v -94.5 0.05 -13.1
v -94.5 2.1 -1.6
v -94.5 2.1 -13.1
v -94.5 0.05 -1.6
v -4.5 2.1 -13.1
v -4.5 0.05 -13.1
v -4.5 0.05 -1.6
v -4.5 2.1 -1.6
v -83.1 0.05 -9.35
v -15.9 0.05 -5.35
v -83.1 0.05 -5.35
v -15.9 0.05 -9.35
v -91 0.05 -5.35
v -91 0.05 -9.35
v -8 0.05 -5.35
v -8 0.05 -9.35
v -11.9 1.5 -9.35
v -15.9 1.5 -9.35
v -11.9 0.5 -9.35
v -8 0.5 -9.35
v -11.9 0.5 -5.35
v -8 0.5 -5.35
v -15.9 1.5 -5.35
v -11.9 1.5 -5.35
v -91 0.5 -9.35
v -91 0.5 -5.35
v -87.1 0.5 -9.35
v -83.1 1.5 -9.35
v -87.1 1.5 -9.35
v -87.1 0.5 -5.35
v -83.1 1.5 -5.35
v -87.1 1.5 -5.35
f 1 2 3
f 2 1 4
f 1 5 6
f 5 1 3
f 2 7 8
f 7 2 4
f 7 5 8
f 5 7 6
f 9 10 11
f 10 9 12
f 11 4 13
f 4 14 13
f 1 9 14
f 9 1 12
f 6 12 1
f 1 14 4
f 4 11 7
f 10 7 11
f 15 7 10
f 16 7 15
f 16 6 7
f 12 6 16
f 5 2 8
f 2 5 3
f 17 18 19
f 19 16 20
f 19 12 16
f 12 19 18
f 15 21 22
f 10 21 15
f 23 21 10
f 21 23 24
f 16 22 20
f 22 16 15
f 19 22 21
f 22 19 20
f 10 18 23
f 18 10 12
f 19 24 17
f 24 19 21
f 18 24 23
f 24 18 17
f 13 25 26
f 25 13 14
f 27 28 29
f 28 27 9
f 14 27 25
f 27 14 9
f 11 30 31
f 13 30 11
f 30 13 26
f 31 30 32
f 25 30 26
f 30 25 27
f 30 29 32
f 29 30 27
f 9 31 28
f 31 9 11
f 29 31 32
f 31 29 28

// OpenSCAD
////// MixTape 3d Printed Case///////////////////////////

// thanks for adding the wall thickness, Philip!

// 

plugHeight = 10.6; // [6:11]
tapeHeight = 11.5; //
topThickness = 1.6; 
screwHoleSize = 1;

bottom_wall_thickness = 2;

usb_charger = false;
cutout_aux_ports = true;
volume_wheel = true;
screws_port = false;

//rotate([55,0,$t*380]) translate([-50,0,0]){
rotate([0,180,0]) translate([0,0,0]){
//PCB();
//parts();

difference(){
    
    union(){
        //tapeBody_screws();
        //tapeTop_screws();
        tapeBody();
        tapeTop();
        //FullCase();
    }
    
    // Plugs 
    translate([2.5,50,tapeHeight-plugHeight+topThickness]) cube([13,20,plugHeight+1],false); 
    translate([83.5,50,tapeHeight-plugHeight+topThickness]) cube([13,20,plugHeight+1],false);
    
    // write protectors 
    translate([10,0,0.5*tapeHeight+1.6]) cube([4,1,4],true);
    translate([13.9,0,0.5*tapeHeight+1.6]) cube([4,3,4],true);
    translate([89,0,0.5*tapeHeight+1.6]) cube([4,1,4],true);
    translate([85.1,0,0.5*tapeHeight+1.6]) cube([4,3,4],true);

    // Power signs
    //if (!usb_charger) {
    //    translate([41,0,0.5*tapeHeight+1.6]) cube([4,1.5,1],true);
    //    translate([41,0,0.5*tapeHeight+1.6]) cube([1,1.5,4],true);
    
    //    translate([58,0,0.5*tapeHeight+1.6]) cube([4,1.5,1],true); 
    //}
}
}


module tapeBody_screws(){
    
    difference(){
        tapeBody();
        //screwHolebtop();
        //screwHolebottom();
        //speakerHole();
    }
}   
module tapeTop_screws(){
    difference(){
        tapeTop();
        //screwHolebtopcover();
        //screwHolebtop();
        //screwHolebottom();
    }    
}   


// Modules ///////////////////////////////

module speakerHole(){   
    translate([0,18,tapeHeight/2 + topThickness])    
    for(z=[-180:45:+180])
      for(x=[4:3:12])
        rotate([90,z,90]) translate([x*0.45,0,0]) cylinder(h=10, r=0.4, $fn=30);
}


module PCB(){
color("DarkKhaki") 
translate ([0,0,tapeHeight+1.6]) linear_extrude(height = 1.6, center = false, convexity = 10, twist = 0) import("mixtape_case_3D_bottom.dxf", convexity=3);
color("Gold") 
translate ([0,0,tapeHeight+3.2]) linear_extrude(height = 0.2, center = false, convexity = 10, twist = 0) import("mixtape_case_3D_PCB.dxf", convexity=3);

color("DarkKhaki") 
translate ([0,0,tapeHeight+2*topThickness]) linear_extrude(height = 1.6, center = false, convexity = 10, twist = 0) import("mixtape_case_3D_PCB_TrapezBoard.dxf", convexity=3);
color("Gold") 
translate ([0,0,tapeHeight+3*topThickness]) linear_extrude(height = 0.2, center = false, convexity = 10, twist = 0) import("mixtape_case_3D_PCB_TrapezCircuit.dxf", convexity=3);
}

module tapeBody(){ 
    difference(){
        union(){
            difference(){ 
                //color("Deeppink") 
                translate ([0,0,1.6]) linear_extrude(height = tapeHeight, center = false, convexity = 10, twist = 0) import("mixtape_case_3D_bottom.dxf", convexity=3);  

                //if (!usb_charger) {
                    //translate ([0,0,0.6]) linear_extrude(height = tapeHeight+4, center = false, convexity = 10, twist = 0) import("mixtape_case_3D_MainCase.dxf", convexity=3);
                //} else {
                    //translate ([0,0,0.6]) linear_extrude(height = tapeHeight+4, center = false, convexity = 10, twist = 0) import("mixtape_case_3D_MainCase_USB.dxf", convexity=3);
                //}
                // cut out for SMD parts below
            translate([86,48,1*tapeHeight+topThickness+3]) cube([10,6,tapeHeight],true);
                
                //Face holes
                translate([25,64,0.5*tapeHeight+topThickness]) cube([12,2,0.7*tapeHeight],true);
                if (!usb_charger) { 
                    translate([49.5,64,0.5*tapeHeight+topThickness]) cube([16,2,0.7*tapeHeight],true); 
                }
                translate([74.3,64,0.5*tapeHeight+topThickness]) cube([12,2,0.7*tapeHeight],true);

                translate([36,65,0.5*tapeHeight+topThickness]) cube([4,2,0.7*tapeHeight],true);
                translate([63,65,0.5*tapeHeight+topThickness]) cube([4,2,0.7*tapeHeight],true);

                if (usb_charger) {
                    // cutout usb port
                    translate([49.5,64,0.5*tapeHeight+topThickness+3])cube([20,14,0.7*tapeHeight+4],true);
                }

                // Side Aux Ports
                if (cutout_aux_ports) {
                   translate([1.5,22,0.8*tapeHeight+topThickness+4.8]) cube([20,12,tapeHeight],true);
                   translate([90,22,0.8*tapeHeight+topThickness+4.8]) cube([20,12,tapeHeight],true);      
                }
                
                // Volume Wheel
                if (volume_wheel) {
                    translate([90,40,0.8*tapeHeight+topThickness+4]) cube([20,17,tapeHeight],true);      
                }
            }
            translate([49.5,7.05,0.5*tapeHeight+topThickness]) cube([90,14,1*tapeHeight],true);
            
        } //end union
        
        
    // wall thickness
        translate([49.5,24+bottom_wall_thickness,0.5*tapeHeight+topThickness-1]) cube([93.2,42,1*tapeHeight+7],true);
        
    translate([49.5,1.8+bottom_wall_thickness,0.5*tapeHeight+topThickness-1]) cube([90,3.4,1*tapeHeight+7],true);
    
    translate([5.1, 4.3 + 0, tapeHeight+topThickness-(tapeHeight)-1   ]) cylinder(h=tapeHeight*1.5, r=2.2, center=false, ,$fn=30);
    translate([94, 4.3 + 0, tapeHeight+topThickness-(tapeHeight)-1   ]) cylinder(h=tapeHeight*1.5, r=2.2, center=false, ,$fn=30);  
        
        translate([49.5,40+bottom_wall_thickness+2.8,0.5*tapeHeight+topThickness-1]) cube([65,35,0.7*tapeHeight+7],true);
    } // end difference
    
    
    
    //color("DarkKhaki") 
    if (!usb_charger) {
    //translate([40,0.05,1.6]) cube([20,10,2.5],false);
    }
    
    //screw left
    if (screws_port){
  translate([4 - 0 , 46.640 + 0, tapeHeight+topThickness-(tapeHeight)   ]) cylinder(h=tapeHeight*1, r=2.8, center=false, ,$fn=30);   
  translate([95 - 0 , 46.640 + 0, tapeHeight+topThickness-(tapeHeight)   ]) cylinder(h=tapeHeight*1, r=2.8, center=false, ,$fn=30); 
  translate([4 - 0 , 2.80 + 0, tapeHeight+topThickness-(tapeHeight)   ]) cylinder(h=tapeHeight*1, r=2.5, center=false, ,$fn=30);   
  translate([95 - 0 , 2.80 + 0, tapeHeight+topThickness-(tapeHeight)   ]) cylinder(h=tapeHeight*1, r=2.5, center=false, ,$fn=30); 
    }
}


module screwHolebottom(){
  translate([4 - 0 , 3 + 0, 0  ]) cylinder(h=tapeHeight*4.1, r=screwHoleSize, center=true, ,$fn=30);
  translate([95 - 0 , 3 + 0, 0  ]) cylinder(h=tapeHeight*4.1, r=screwHoleSize, center=true, ,$fn=30);
}

module screwHolebtop(){
  //screw left
  translate([4.586 - 0 , 46.640 + 0, 0  ]) cylinder(h=11*4.1, r=screwHoleSize, center=true, ,$fn=30);
  //screw right
  translate([94.998 - 0 , 46.640 + 0, 0  ]) cylinder(h=11*4.1, r=screwHoleSize, center=true, ,$fn=30);
}


module screwHolebtopcover(){   
  //screw top left
  translate([4.586 - 0 , 46.640 + 0, 0+0-(0) - 0.0  ]) cylinder(h=topThickness*0.5, r=1.8, center=true, ,$fn=30);
  //screw top right
  translate([94.998 - 0 , 46.640 + 0, 0 - 0.0  ]) cylinder(h=topThickness*0.5, r=1.8, center=true, ,$fn=30); 

  //screw lower left
  translate([4 - 0 , 3 + 0, 0+0-(0) - 0.0  ]) cylinder(h=topThickness*0.5, r=1.8, center=true, ,$fn=30);
  //screw lower right
  translate([95 - 0 , 3 + 0, 0 - 0.0  ]) cylinder(h=topThickness*0.5, r=1.8, center=true, ,$fn=30);     
    
}


module tapeTop(){ 
 
difference(){ 
 color("Deeppink") 
     translate ([0,0,-1.5]) linear_extrude(height = 1.5, center = false, convexity = 10, twist = 0) import("mixtape_case_3D_TopTrapez.dxf", convexity=3);
     
   color("Gold") 
     translate ([0,0,-2.2]) linear_extrude(height = 3, center = false, convexity = 10, twist = 0) import("mixtape_case_3D_Holes.dxf", convexity=3);
   translate([50,53,-2.2]) cylinder(h=1.2, r=1.3, center=false, ,$fn=30);
}   
    

difference(){    
  color("Deeppink") 
     translate ([0,0,0]) linear_extrude(height = 1.6, center = false, convexity = 10, twist = 0) import("mixtape_case_3D_bottom.dxf", convexity=3);

  translate([4,3,-1]) cylinder(h=1.5, r=1.3, center=false, ,$fn=30);
  translate([95,3,-1]) cylinder(h=1.5, r=1.3, center=false, ,$fn=30);
  translate([4,61,-1]) cylinder(h=1.5, r=1.3, center=false, ,$fn=30);
  translate([95,61,-1]) cylinder(h=1.5, r=1.3, center=false, ,$fn=30);
    
  color("Pink") 
     translate ([0,0,-1.3]) linear_extrude(height = 2, center = false, convexity = 10, twist = 0) import("mixtape_case_3D_WindowRect.dxf", convexity=3); 
    
  difference(){    
  color("Gold") 
     translate ([0,0,-0.5]) linear_extrude(height = 1, center = false, convexity = 10, twist = 0) import("mixtape_case_3D_BigRect.dxf", convexity=3);  
  

  translate ([0,0,-3]) linear_extrude(height = 10, center = false, convexity = 10, twist = 0) import("mixtape_case_3D_MidRect.dxf", convexity=3);   
  }
  
  translate ([0,0,-3]) linear_extrude(height = 5.5, center = false, convexity = 10, twist = 0) import("mixtape_case_3D_Wheels.dxf", convexity=3); 
}

  translate ([0,0,0.4]) linear_extrude(height = 1.2, center = false, convexity = 10, twist = 0) import("mixtape_case_3D_NutWheels.dxf", convexity=3); 

}
 

module parts(){
    // IC-Socket
  color("Grey")
      translate([44,22.5,tapeHeight+2*topThickness]) cube([11,13,4],false);
    
  difference(){
  color("Black")
      translate([45,23.5,tapeHeight+2*topThickness]) cube([9,11,7],false);
        
    translate([49.5,34.5,tapeHeight+2*topThickness+6]) cylinder(h=10, r=1.5, center=false, ,$fn=30);
    }
    
    // NEO-Pixels
    for (a = [ 0 : 6.3 : 46 ])
    translate([a,0,0]) NEOpixel();
    
    module NEOpixel(){
    color("White")
      translate([25.2,52.5,tapeHeight+3*topThickness]) cube([5,5,2],false);
        
    color("Deeppink")
      translate([27.7,55,tapeHeight+3*topThickness]) cylinder(h=2.5, r=2, center=false, ,$fn=30);
    }
    
    // Pots
    potentiometer();
    translate ([42,0,0]) potentiometer();
    
    module potentiometer(){
    color("Grey")
      translate([29,29,tapeHeight+2*topThickness]) cylinder(h=10, r=3.5, center=false, ,$fn=30);
    
    color("Deeppink")
        translate([29,29,tapeHeight+2*topThickness+2]) cylinder(h=12, r1=6, r2=4.5, center=false, ,$fn=30);
    }
    
    // Buttons
    button();
    translate ([58,0,0]) button();
    
    module button(){
    color("Grey")
      translate([17.5,9.8,tapeHeight+2*topThickness]) cube([6,6,3],false);
        
    color("Red")
      translate([20.5,12.8,tapeHeight+2*topThickness]) cylinder(h=5, r=1.5, center=false, ,$fn=30);
    }

}
